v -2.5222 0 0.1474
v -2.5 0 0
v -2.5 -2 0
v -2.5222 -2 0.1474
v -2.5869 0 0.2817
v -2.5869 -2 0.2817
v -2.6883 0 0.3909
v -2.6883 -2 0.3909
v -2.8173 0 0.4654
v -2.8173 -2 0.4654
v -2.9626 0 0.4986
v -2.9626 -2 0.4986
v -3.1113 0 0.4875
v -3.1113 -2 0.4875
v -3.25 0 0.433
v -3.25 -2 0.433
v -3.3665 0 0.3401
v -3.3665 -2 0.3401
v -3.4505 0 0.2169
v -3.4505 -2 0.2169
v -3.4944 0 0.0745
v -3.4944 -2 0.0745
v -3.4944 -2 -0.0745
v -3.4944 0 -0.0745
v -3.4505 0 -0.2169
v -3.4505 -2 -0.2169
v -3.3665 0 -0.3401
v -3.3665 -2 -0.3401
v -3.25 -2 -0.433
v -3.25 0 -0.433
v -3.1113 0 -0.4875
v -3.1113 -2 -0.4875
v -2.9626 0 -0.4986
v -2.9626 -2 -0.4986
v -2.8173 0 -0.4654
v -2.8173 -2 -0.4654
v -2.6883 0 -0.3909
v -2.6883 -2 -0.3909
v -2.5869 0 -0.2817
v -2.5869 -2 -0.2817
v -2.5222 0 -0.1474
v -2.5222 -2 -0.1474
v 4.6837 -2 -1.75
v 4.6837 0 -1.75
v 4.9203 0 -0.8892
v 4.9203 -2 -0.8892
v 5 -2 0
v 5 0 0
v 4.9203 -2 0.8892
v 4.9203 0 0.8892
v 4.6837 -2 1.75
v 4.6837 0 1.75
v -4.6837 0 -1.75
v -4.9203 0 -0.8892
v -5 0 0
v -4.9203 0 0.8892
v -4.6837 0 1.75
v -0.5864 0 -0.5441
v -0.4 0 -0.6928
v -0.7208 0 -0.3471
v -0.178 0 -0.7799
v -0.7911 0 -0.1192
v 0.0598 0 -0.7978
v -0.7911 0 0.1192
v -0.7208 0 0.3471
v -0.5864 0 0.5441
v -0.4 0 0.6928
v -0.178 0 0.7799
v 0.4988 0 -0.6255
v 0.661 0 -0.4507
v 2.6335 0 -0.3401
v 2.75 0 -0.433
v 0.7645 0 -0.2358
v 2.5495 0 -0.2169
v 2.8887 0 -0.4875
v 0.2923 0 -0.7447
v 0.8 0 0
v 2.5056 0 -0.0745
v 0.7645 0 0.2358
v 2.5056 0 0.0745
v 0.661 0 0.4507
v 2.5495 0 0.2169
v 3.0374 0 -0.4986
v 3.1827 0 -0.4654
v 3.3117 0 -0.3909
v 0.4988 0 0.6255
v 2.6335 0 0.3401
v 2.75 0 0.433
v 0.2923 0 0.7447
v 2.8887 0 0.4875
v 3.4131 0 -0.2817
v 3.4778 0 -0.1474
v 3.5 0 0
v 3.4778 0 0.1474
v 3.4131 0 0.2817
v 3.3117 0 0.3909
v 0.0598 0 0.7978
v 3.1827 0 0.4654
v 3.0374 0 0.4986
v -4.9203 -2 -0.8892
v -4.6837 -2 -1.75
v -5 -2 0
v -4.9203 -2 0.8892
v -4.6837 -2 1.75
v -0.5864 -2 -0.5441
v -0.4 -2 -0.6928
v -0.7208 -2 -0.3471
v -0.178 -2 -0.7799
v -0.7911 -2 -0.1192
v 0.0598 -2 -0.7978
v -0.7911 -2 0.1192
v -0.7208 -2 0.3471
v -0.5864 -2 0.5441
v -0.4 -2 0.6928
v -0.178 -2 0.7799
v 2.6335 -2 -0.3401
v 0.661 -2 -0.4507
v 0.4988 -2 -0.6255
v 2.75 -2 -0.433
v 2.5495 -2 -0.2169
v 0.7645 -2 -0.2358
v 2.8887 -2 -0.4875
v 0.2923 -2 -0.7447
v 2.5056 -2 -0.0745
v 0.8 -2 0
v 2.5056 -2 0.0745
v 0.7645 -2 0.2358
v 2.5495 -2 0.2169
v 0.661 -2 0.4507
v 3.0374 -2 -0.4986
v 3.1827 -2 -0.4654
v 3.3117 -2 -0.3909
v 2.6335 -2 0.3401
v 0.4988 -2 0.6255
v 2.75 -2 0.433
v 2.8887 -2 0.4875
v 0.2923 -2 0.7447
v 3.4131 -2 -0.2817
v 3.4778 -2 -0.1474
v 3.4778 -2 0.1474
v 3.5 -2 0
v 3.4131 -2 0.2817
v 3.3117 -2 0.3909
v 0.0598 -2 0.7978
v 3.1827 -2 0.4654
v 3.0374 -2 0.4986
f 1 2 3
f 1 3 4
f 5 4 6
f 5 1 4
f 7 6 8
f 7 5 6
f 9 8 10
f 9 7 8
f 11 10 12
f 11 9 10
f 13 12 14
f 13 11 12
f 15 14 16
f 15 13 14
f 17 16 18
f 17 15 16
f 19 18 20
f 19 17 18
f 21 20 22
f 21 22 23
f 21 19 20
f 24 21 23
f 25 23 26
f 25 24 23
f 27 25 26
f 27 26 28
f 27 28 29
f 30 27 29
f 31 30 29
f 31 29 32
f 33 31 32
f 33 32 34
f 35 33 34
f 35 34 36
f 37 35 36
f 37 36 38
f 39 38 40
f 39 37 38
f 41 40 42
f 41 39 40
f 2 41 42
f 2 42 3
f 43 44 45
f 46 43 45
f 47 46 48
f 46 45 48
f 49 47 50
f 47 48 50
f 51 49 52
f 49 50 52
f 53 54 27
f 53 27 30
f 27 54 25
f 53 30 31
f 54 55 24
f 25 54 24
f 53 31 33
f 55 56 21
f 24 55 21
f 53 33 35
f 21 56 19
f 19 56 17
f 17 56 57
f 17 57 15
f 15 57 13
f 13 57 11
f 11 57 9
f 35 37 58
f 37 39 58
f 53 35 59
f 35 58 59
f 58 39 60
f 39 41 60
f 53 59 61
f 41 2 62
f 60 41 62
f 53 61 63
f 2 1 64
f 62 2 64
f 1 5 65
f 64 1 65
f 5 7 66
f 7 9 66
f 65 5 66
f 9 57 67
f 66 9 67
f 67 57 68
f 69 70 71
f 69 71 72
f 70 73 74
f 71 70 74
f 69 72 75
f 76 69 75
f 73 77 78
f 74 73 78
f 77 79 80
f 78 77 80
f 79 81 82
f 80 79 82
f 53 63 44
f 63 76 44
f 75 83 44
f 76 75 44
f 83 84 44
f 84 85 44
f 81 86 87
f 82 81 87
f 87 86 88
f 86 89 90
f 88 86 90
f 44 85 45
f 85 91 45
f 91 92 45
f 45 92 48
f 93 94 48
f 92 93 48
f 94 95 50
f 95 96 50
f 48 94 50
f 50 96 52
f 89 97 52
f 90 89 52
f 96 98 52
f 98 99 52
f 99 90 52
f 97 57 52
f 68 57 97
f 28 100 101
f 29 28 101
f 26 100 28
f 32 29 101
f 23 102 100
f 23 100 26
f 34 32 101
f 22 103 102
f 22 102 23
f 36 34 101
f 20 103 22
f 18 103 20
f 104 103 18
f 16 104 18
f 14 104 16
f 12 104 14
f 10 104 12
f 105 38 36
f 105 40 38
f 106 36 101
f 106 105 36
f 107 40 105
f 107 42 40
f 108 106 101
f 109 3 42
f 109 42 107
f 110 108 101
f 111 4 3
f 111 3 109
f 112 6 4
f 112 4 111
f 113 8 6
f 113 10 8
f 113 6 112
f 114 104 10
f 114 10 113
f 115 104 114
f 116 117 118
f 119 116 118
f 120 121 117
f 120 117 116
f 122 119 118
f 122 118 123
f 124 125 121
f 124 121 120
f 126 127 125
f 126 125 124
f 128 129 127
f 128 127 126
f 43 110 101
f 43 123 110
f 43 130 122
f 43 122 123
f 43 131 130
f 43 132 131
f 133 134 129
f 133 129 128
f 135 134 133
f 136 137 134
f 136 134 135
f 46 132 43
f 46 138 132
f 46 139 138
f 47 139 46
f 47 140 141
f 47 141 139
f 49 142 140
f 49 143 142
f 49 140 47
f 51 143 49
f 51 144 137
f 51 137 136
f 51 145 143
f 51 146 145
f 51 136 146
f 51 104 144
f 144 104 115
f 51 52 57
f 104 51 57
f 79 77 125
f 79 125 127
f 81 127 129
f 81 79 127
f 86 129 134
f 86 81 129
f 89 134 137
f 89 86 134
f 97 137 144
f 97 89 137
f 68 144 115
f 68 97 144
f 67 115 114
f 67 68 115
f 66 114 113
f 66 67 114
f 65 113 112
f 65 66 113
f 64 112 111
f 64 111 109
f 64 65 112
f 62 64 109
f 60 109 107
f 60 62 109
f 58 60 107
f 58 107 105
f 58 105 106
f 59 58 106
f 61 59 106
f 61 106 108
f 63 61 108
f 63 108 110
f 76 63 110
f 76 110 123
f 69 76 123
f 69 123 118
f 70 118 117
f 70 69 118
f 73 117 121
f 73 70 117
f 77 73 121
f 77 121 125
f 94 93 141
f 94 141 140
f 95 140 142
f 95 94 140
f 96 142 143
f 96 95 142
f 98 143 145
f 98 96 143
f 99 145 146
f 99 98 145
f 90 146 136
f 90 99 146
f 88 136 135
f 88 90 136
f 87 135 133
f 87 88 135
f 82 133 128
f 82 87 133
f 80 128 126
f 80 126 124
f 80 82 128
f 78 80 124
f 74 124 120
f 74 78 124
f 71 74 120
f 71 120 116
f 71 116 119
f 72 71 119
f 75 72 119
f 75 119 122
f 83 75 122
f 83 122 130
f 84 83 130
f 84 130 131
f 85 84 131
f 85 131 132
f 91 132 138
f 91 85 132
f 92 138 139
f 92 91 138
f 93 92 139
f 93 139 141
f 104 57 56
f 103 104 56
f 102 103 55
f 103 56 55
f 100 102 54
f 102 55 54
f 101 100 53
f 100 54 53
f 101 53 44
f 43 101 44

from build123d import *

# Parameters (mm, degrees)
F0_R     = 0.5
F0_R_2   = 0.8
F1_DEPTH = 2


with BuildPart() as f1:
    # F0 (on Front) → F1 (new body)
    with BuildSketch(Plane.XZ):
        with BuildLine():
            Line((4.683748, 1.75), (-4.683748, 1.75))
            ThreePointArc((-4.683748, 1.75), (-5, 0), (-4.683748, -1.75))
            Line((-4.683748, -1.75), (4.683748, -1.75))
            ThreePointArc((4.683748, -1.75), (5, 0), (4.683748, 1.75))
        make_face()
        with Locations((-3, 0)):
            Circle(F0_R, mode=Mode.SUBTRACT)
        Circle(F0_R_2, mode=Mode.SUBTRACT)
        with Locations((3, 0)):
            Circle(F0_R, mode=Mode.SUBTRACT)
    extrude(amount=F1_DEPTH)


solid = f1.part
